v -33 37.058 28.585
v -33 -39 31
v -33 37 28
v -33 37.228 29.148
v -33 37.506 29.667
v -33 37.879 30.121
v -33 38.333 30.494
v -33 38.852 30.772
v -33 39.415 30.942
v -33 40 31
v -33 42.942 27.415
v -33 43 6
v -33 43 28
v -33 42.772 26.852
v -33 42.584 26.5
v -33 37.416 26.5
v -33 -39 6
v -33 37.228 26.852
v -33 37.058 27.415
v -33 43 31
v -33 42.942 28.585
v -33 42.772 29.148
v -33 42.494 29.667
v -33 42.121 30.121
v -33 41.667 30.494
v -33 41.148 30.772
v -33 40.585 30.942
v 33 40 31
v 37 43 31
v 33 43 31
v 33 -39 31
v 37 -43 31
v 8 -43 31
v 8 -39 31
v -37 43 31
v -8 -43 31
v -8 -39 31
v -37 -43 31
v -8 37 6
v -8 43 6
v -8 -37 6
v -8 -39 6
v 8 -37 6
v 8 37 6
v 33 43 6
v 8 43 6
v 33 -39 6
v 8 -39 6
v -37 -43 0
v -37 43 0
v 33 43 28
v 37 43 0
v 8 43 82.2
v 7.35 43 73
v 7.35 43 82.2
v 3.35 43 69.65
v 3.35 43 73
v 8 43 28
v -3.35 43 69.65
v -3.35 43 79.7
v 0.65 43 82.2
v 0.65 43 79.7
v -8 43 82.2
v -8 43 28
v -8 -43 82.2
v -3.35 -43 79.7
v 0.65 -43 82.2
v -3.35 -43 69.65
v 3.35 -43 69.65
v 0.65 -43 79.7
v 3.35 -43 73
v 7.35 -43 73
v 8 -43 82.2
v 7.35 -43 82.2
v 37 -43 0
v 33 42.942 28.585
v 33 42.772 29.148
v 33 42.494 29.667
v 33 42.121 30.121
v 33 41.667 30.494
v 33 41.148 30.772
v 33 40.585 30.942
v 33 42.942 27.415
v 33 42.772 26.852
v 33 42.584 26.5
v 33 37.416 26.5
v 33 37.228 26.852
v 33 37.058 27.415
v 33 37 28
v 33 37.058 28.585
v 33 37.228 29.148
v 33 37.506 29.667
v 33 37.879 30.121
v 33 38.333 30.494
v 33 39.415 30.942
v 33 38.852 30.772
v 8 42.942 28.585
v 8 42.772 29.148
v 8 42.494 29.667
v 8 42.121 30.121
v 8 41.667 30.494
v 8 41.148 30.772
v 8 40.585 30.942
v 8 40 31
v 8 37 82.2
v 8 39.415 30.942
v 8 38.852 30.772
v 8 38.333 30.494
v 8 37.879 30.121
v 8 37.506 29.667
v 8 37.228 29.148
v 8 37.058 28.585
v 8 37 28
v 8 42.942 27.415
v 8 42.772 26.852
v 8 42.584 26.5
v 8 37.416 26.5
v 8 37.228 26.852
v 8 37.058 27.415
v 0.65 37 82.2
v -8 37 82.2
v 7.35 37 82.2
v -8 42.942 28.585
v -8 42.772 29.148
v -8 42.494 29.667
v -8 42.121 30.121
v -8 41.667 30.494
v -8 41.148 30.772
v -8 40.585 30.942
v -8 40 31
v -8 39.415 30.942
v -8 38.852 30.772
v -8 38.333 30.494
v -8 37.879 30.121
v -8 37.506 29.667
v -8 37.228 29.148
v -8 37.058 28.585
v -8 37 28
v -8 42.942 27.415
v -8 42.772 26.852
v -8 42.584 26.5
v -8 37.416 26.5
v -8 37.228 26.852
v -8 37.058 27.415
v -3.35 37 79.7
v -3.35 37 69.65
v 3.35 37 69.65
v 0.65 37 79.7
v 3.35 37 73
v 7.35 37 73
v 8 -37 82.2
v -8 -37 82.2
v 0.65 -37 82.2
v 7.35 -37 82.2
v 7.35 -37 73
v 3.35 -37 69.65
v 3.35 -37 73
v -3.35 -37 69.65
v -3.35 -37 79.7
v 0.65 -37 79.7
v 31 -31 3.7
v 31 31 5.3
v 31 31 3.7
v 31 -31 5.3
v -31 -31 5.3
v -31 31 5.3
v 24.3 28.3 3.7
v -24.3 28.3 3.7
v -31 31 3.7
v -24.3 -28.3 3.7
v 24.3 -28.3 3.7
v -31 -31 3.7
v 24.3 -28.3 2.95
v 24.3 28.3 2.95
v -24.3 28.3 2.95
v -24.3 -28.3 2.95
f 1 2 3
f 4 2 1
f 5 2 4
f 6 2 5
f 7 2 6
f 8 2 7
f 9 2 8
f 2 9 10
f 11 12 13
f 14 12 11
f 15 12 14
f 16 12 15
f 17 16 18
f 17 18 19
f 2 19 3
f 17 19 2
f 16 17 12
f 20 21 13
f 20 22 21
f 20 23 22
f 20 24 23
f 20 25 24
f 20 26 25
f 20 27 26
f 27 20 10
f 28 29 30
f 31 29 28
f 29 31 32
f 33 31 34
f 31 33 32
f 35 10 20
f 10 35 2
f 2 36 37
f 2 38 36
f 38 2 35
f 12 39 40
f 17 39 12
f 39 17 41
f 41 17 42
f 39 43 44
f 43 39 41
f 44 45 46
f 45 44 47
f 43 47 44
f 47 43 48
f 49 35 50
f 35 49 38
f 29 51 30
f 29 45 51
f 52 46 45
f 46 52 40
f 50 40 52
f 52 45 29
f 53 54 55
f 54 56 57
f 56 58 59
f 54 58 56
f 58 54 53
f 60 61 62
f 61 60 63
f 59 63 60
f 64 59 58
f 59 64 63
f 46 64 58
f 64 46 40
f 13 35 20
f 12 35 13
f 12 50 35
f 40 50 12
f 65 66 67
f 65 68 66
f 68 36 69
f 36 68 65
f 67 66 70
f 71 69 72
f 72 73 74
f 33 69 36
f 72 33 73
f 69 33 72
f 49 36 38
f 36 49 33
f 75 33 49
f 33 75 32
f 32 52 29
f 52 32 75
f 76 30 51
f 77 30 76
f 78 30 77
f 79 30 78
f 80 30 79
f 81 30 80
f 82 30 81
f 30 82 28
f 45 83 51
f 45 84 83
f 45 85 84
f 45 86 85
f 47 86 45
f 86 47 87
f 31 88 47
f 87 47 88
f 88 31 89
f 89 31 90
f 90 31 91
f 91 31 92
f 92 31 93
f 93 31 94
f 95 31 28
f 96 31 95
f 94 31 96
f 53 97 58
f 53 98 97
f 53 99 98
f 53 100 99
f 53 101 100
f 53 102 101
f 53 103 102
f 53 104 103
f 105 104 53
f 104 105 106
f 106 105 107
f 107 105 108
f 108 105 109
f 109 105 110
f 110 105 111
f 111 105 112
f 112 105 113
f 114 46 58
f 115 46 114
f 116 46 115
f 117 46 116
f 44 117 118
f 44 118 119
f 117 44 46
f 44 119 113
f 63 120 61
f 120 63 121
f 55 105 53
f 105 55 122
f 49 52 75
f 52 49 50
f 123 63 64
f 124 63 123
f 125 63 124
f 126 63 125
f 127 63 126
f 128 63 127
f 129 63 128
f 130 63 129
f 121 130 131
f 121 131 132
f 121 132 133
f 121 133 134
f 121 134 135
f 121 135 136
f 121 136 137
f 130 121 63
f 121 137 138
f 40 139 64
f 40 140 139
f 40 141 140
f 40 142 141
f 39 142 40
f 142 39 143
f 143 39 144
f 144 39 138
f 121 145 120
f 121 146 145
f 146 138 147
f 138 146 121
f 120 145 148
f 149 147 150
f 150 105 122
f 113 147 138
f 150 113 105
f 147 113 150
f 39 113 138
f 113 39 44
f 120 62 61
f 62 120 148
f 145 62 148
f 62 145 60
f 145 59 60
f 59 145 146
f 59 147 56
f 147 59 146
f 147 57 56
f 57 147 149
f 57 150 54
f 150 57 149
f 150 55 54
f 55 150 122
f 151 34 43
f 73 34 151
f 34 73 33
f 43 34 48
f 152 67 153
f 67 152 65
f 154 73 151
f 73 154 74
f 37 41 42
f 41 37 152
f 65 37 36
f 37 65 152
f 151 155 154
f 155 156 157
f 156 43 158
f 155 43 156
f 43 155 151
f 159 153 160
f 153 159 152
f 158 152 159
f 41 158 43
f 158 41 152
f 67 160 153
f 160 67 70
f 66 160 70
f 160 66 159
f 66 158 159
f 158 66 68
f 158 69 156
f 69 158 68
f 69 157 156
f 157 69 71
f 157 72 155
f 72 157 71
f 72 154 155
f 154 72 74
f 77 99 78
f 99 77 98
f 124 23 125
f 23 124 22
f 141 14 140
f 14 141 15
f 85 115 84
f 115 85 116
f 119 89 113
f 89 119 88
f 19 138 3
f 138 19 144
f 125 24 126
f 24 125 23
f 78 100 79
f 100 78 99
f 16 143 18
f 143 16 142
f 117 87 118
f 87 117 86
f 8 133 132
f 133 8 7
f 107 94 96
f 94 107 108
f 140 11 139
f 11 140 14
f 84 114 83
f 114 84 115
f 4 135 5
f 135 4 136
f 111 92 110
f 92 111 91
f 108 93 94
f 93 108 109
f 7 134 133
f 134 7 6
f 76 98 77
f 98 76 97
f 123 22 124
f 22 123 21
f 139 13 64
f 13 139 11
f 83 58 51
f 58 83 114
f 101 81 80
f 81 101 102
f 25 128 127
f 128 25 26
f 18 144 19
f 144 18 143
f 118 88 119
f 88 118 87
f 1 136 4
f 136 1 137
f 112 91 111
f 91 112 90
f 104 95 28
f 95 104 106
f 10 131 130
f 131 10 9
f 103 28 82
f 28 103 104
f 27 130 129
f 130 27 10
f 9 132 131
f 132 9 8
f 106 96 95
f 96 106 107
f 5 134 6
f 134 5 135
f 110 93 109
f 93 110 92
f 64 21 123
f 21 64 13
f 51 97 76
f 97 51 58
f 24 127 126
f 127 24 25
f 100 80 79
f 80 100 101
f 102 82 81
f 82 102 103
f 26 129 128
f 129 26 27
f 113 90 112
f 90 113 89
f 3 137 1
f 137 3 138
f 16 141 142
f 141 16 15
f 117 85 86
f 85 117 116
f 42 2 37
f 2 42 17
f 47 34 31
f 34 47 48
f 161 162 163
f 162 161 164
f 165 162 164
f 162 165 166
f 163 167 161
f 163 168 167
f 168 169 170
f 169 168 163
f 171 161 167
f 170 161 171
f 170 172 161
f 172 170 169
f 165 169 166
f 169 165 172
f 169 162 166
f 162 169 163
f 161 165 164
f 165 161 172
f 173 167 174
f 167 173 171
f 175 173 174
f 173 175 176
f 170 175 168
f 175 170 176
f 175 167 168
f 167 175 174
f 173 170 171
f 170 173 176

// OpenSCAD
// ferris/gondola.scad  (redesign v3, #18: side-arm open-top gondola)
// Carries one M5Stack K151 unit (base 48x56, whole 54x70.5x61.5, 187.2 g).
//
// v3 lesson (7/19 test): a central top bridge blocks EVERY loading path -
// the robot could not be placed at all. The bridge is gone; the axle is now
// held by TWO hook towers at the front/back edges (outside the robot's 70.5
// footprint), so the top is fully open and the unit drops straight in from
// above into the nested floor pockets. Same as the izakaya drink-wheel that
// inspired the build.
//
// Loading corridor (numeric): unit 54(X) x 70.5(Y), descends from above.
//   side rails inner  +/-37  vs unit +/-27    -> 10.0 mm/side
//   hook towers inner +/-37(Y) vs unit +/-35.25 -> 1.75 mm/side
//   front bar inner    +37   vs unit +35.25   -> 1.75 mm
//   backrest inner     -39   vs unit -35.25   -> 3.75 mm
//
// Axes: +X = left/right, +Y = wheel axis (hook towers), Z = up. Seat top z=6.

include <../params.scad>;

seat_z    = gon_floor_t;                        // 6, top of the seat plate
tower_top = gon_pivot_z + gon_hook_d + 2.5;     // 82.2: 2.5 mm roof over the transfer channel
tower_w   = 16;                                 // hook tower width (X)
tower_t   = 6;                                  // hook tower thickness (Y)

module d_bar(len, d) {
    // horizontal bar (along X) with a flat underside -> bridges support-free
    intersection() {
        rotate([0, 90, 0]) cylinder(d = d, h = len, center = true, $fn = 32);
        translate([0, 0, 1.5]) cube([len + 1, d + 1, d], center = true);
    }
}

module j_slot_2d() {
    // keyhole profile in the X-Z plane; rod centre rests at (0, gon_pivot_z).
    // Drop in at the +4 offset entry, slide sideways, settle ~3 mm down.
    union() {
        translate([4 - gon_hook_d/2, gon_pivot_z])
            square([gon_hook_d, tower_top - gon_pivot_z + 1]);   // entry
        translate([-gon_hook_d/2, gon_pivot_z])
            square([4 + gon_hook_d, gon_hook_d]);                // transfer
        translate([0, gon_pivot_z]) circle(d = gon_hook_d);      // seat
        translate([-gon_hook_d/2, gon_pivot_z - gon_hook_d/2])
            square([gon_hook_d, gon_hook_d/2]);
    }
}

module hook_tower(y_out) {
    // tower standing on the floor edge, J-slot cut through its 6 mm thickness
    difference() {
        translate([-tower_w/2, y_out - tower_t, 0])
            cube([tower_w, tower_t, tower_top]);
        translate([0, y_out + 1, 0])
            rotate([90, 0, 0])
                linear_extrude(tower_t + 2)
                    j_slot_2d();
    }
}

module gondola() {
    difference() {
        union() {
            // --- seat plate ---
            translate([0, 0, seat_z/2])
                cube([gon_floor_x, gon_floor_y, gon_floor_t], center = true);
            // --- side rails (+/-X), low, leave the top open ---
            for (sx = [-1, 1])
                translate([sx * (gon_floor_x/2 - gon_wall_t/2), 0, seat_z + gon_side_h/2])
                    cube([gon_wall_t, gon_floor_y, gon_side_h], center = true);
            // --- backrest wall (-Y) ---
            translate([0, -gon_floor_y/2 + gon_wall_t/2, seat_z + gon_backrest_h/2])
                cube([gon_floor_x, gon_wall_t, gon_backrest_h], center = true);
            // --- hook towers on the front/back edges (axle along Y) ---
            hook_tower(gon_floor_y/2);                    // front (+Y)
            mirror([0, 1, 0]) hook_tower(gon_floor_y/2);  // back  (-Y)
            // --- front safety bar (merges into the front tower) ---
            translate([0, gon_floor_y/2 - gon_bar_d/2, seat_z + gon_bar_rise])
                d_bar(2 * gon_post_cx, gon_bar_d);
        }
        // --- two-stage nested floor pockets ---
        translate([0, 0, seat_z - gon_pocket_o_d])
            cube([gon_pocket_o, gon_pocket_o, gon_pocket_o_d + 0.1], center = true);
        translate([0, 0, seat_z - gon_pocket_i_d])
            cube([gon_pocket_i_x, gon_pocket_i_y, gon_pocket_i_d + 0.1], center = true);
    }
}

gondola();
